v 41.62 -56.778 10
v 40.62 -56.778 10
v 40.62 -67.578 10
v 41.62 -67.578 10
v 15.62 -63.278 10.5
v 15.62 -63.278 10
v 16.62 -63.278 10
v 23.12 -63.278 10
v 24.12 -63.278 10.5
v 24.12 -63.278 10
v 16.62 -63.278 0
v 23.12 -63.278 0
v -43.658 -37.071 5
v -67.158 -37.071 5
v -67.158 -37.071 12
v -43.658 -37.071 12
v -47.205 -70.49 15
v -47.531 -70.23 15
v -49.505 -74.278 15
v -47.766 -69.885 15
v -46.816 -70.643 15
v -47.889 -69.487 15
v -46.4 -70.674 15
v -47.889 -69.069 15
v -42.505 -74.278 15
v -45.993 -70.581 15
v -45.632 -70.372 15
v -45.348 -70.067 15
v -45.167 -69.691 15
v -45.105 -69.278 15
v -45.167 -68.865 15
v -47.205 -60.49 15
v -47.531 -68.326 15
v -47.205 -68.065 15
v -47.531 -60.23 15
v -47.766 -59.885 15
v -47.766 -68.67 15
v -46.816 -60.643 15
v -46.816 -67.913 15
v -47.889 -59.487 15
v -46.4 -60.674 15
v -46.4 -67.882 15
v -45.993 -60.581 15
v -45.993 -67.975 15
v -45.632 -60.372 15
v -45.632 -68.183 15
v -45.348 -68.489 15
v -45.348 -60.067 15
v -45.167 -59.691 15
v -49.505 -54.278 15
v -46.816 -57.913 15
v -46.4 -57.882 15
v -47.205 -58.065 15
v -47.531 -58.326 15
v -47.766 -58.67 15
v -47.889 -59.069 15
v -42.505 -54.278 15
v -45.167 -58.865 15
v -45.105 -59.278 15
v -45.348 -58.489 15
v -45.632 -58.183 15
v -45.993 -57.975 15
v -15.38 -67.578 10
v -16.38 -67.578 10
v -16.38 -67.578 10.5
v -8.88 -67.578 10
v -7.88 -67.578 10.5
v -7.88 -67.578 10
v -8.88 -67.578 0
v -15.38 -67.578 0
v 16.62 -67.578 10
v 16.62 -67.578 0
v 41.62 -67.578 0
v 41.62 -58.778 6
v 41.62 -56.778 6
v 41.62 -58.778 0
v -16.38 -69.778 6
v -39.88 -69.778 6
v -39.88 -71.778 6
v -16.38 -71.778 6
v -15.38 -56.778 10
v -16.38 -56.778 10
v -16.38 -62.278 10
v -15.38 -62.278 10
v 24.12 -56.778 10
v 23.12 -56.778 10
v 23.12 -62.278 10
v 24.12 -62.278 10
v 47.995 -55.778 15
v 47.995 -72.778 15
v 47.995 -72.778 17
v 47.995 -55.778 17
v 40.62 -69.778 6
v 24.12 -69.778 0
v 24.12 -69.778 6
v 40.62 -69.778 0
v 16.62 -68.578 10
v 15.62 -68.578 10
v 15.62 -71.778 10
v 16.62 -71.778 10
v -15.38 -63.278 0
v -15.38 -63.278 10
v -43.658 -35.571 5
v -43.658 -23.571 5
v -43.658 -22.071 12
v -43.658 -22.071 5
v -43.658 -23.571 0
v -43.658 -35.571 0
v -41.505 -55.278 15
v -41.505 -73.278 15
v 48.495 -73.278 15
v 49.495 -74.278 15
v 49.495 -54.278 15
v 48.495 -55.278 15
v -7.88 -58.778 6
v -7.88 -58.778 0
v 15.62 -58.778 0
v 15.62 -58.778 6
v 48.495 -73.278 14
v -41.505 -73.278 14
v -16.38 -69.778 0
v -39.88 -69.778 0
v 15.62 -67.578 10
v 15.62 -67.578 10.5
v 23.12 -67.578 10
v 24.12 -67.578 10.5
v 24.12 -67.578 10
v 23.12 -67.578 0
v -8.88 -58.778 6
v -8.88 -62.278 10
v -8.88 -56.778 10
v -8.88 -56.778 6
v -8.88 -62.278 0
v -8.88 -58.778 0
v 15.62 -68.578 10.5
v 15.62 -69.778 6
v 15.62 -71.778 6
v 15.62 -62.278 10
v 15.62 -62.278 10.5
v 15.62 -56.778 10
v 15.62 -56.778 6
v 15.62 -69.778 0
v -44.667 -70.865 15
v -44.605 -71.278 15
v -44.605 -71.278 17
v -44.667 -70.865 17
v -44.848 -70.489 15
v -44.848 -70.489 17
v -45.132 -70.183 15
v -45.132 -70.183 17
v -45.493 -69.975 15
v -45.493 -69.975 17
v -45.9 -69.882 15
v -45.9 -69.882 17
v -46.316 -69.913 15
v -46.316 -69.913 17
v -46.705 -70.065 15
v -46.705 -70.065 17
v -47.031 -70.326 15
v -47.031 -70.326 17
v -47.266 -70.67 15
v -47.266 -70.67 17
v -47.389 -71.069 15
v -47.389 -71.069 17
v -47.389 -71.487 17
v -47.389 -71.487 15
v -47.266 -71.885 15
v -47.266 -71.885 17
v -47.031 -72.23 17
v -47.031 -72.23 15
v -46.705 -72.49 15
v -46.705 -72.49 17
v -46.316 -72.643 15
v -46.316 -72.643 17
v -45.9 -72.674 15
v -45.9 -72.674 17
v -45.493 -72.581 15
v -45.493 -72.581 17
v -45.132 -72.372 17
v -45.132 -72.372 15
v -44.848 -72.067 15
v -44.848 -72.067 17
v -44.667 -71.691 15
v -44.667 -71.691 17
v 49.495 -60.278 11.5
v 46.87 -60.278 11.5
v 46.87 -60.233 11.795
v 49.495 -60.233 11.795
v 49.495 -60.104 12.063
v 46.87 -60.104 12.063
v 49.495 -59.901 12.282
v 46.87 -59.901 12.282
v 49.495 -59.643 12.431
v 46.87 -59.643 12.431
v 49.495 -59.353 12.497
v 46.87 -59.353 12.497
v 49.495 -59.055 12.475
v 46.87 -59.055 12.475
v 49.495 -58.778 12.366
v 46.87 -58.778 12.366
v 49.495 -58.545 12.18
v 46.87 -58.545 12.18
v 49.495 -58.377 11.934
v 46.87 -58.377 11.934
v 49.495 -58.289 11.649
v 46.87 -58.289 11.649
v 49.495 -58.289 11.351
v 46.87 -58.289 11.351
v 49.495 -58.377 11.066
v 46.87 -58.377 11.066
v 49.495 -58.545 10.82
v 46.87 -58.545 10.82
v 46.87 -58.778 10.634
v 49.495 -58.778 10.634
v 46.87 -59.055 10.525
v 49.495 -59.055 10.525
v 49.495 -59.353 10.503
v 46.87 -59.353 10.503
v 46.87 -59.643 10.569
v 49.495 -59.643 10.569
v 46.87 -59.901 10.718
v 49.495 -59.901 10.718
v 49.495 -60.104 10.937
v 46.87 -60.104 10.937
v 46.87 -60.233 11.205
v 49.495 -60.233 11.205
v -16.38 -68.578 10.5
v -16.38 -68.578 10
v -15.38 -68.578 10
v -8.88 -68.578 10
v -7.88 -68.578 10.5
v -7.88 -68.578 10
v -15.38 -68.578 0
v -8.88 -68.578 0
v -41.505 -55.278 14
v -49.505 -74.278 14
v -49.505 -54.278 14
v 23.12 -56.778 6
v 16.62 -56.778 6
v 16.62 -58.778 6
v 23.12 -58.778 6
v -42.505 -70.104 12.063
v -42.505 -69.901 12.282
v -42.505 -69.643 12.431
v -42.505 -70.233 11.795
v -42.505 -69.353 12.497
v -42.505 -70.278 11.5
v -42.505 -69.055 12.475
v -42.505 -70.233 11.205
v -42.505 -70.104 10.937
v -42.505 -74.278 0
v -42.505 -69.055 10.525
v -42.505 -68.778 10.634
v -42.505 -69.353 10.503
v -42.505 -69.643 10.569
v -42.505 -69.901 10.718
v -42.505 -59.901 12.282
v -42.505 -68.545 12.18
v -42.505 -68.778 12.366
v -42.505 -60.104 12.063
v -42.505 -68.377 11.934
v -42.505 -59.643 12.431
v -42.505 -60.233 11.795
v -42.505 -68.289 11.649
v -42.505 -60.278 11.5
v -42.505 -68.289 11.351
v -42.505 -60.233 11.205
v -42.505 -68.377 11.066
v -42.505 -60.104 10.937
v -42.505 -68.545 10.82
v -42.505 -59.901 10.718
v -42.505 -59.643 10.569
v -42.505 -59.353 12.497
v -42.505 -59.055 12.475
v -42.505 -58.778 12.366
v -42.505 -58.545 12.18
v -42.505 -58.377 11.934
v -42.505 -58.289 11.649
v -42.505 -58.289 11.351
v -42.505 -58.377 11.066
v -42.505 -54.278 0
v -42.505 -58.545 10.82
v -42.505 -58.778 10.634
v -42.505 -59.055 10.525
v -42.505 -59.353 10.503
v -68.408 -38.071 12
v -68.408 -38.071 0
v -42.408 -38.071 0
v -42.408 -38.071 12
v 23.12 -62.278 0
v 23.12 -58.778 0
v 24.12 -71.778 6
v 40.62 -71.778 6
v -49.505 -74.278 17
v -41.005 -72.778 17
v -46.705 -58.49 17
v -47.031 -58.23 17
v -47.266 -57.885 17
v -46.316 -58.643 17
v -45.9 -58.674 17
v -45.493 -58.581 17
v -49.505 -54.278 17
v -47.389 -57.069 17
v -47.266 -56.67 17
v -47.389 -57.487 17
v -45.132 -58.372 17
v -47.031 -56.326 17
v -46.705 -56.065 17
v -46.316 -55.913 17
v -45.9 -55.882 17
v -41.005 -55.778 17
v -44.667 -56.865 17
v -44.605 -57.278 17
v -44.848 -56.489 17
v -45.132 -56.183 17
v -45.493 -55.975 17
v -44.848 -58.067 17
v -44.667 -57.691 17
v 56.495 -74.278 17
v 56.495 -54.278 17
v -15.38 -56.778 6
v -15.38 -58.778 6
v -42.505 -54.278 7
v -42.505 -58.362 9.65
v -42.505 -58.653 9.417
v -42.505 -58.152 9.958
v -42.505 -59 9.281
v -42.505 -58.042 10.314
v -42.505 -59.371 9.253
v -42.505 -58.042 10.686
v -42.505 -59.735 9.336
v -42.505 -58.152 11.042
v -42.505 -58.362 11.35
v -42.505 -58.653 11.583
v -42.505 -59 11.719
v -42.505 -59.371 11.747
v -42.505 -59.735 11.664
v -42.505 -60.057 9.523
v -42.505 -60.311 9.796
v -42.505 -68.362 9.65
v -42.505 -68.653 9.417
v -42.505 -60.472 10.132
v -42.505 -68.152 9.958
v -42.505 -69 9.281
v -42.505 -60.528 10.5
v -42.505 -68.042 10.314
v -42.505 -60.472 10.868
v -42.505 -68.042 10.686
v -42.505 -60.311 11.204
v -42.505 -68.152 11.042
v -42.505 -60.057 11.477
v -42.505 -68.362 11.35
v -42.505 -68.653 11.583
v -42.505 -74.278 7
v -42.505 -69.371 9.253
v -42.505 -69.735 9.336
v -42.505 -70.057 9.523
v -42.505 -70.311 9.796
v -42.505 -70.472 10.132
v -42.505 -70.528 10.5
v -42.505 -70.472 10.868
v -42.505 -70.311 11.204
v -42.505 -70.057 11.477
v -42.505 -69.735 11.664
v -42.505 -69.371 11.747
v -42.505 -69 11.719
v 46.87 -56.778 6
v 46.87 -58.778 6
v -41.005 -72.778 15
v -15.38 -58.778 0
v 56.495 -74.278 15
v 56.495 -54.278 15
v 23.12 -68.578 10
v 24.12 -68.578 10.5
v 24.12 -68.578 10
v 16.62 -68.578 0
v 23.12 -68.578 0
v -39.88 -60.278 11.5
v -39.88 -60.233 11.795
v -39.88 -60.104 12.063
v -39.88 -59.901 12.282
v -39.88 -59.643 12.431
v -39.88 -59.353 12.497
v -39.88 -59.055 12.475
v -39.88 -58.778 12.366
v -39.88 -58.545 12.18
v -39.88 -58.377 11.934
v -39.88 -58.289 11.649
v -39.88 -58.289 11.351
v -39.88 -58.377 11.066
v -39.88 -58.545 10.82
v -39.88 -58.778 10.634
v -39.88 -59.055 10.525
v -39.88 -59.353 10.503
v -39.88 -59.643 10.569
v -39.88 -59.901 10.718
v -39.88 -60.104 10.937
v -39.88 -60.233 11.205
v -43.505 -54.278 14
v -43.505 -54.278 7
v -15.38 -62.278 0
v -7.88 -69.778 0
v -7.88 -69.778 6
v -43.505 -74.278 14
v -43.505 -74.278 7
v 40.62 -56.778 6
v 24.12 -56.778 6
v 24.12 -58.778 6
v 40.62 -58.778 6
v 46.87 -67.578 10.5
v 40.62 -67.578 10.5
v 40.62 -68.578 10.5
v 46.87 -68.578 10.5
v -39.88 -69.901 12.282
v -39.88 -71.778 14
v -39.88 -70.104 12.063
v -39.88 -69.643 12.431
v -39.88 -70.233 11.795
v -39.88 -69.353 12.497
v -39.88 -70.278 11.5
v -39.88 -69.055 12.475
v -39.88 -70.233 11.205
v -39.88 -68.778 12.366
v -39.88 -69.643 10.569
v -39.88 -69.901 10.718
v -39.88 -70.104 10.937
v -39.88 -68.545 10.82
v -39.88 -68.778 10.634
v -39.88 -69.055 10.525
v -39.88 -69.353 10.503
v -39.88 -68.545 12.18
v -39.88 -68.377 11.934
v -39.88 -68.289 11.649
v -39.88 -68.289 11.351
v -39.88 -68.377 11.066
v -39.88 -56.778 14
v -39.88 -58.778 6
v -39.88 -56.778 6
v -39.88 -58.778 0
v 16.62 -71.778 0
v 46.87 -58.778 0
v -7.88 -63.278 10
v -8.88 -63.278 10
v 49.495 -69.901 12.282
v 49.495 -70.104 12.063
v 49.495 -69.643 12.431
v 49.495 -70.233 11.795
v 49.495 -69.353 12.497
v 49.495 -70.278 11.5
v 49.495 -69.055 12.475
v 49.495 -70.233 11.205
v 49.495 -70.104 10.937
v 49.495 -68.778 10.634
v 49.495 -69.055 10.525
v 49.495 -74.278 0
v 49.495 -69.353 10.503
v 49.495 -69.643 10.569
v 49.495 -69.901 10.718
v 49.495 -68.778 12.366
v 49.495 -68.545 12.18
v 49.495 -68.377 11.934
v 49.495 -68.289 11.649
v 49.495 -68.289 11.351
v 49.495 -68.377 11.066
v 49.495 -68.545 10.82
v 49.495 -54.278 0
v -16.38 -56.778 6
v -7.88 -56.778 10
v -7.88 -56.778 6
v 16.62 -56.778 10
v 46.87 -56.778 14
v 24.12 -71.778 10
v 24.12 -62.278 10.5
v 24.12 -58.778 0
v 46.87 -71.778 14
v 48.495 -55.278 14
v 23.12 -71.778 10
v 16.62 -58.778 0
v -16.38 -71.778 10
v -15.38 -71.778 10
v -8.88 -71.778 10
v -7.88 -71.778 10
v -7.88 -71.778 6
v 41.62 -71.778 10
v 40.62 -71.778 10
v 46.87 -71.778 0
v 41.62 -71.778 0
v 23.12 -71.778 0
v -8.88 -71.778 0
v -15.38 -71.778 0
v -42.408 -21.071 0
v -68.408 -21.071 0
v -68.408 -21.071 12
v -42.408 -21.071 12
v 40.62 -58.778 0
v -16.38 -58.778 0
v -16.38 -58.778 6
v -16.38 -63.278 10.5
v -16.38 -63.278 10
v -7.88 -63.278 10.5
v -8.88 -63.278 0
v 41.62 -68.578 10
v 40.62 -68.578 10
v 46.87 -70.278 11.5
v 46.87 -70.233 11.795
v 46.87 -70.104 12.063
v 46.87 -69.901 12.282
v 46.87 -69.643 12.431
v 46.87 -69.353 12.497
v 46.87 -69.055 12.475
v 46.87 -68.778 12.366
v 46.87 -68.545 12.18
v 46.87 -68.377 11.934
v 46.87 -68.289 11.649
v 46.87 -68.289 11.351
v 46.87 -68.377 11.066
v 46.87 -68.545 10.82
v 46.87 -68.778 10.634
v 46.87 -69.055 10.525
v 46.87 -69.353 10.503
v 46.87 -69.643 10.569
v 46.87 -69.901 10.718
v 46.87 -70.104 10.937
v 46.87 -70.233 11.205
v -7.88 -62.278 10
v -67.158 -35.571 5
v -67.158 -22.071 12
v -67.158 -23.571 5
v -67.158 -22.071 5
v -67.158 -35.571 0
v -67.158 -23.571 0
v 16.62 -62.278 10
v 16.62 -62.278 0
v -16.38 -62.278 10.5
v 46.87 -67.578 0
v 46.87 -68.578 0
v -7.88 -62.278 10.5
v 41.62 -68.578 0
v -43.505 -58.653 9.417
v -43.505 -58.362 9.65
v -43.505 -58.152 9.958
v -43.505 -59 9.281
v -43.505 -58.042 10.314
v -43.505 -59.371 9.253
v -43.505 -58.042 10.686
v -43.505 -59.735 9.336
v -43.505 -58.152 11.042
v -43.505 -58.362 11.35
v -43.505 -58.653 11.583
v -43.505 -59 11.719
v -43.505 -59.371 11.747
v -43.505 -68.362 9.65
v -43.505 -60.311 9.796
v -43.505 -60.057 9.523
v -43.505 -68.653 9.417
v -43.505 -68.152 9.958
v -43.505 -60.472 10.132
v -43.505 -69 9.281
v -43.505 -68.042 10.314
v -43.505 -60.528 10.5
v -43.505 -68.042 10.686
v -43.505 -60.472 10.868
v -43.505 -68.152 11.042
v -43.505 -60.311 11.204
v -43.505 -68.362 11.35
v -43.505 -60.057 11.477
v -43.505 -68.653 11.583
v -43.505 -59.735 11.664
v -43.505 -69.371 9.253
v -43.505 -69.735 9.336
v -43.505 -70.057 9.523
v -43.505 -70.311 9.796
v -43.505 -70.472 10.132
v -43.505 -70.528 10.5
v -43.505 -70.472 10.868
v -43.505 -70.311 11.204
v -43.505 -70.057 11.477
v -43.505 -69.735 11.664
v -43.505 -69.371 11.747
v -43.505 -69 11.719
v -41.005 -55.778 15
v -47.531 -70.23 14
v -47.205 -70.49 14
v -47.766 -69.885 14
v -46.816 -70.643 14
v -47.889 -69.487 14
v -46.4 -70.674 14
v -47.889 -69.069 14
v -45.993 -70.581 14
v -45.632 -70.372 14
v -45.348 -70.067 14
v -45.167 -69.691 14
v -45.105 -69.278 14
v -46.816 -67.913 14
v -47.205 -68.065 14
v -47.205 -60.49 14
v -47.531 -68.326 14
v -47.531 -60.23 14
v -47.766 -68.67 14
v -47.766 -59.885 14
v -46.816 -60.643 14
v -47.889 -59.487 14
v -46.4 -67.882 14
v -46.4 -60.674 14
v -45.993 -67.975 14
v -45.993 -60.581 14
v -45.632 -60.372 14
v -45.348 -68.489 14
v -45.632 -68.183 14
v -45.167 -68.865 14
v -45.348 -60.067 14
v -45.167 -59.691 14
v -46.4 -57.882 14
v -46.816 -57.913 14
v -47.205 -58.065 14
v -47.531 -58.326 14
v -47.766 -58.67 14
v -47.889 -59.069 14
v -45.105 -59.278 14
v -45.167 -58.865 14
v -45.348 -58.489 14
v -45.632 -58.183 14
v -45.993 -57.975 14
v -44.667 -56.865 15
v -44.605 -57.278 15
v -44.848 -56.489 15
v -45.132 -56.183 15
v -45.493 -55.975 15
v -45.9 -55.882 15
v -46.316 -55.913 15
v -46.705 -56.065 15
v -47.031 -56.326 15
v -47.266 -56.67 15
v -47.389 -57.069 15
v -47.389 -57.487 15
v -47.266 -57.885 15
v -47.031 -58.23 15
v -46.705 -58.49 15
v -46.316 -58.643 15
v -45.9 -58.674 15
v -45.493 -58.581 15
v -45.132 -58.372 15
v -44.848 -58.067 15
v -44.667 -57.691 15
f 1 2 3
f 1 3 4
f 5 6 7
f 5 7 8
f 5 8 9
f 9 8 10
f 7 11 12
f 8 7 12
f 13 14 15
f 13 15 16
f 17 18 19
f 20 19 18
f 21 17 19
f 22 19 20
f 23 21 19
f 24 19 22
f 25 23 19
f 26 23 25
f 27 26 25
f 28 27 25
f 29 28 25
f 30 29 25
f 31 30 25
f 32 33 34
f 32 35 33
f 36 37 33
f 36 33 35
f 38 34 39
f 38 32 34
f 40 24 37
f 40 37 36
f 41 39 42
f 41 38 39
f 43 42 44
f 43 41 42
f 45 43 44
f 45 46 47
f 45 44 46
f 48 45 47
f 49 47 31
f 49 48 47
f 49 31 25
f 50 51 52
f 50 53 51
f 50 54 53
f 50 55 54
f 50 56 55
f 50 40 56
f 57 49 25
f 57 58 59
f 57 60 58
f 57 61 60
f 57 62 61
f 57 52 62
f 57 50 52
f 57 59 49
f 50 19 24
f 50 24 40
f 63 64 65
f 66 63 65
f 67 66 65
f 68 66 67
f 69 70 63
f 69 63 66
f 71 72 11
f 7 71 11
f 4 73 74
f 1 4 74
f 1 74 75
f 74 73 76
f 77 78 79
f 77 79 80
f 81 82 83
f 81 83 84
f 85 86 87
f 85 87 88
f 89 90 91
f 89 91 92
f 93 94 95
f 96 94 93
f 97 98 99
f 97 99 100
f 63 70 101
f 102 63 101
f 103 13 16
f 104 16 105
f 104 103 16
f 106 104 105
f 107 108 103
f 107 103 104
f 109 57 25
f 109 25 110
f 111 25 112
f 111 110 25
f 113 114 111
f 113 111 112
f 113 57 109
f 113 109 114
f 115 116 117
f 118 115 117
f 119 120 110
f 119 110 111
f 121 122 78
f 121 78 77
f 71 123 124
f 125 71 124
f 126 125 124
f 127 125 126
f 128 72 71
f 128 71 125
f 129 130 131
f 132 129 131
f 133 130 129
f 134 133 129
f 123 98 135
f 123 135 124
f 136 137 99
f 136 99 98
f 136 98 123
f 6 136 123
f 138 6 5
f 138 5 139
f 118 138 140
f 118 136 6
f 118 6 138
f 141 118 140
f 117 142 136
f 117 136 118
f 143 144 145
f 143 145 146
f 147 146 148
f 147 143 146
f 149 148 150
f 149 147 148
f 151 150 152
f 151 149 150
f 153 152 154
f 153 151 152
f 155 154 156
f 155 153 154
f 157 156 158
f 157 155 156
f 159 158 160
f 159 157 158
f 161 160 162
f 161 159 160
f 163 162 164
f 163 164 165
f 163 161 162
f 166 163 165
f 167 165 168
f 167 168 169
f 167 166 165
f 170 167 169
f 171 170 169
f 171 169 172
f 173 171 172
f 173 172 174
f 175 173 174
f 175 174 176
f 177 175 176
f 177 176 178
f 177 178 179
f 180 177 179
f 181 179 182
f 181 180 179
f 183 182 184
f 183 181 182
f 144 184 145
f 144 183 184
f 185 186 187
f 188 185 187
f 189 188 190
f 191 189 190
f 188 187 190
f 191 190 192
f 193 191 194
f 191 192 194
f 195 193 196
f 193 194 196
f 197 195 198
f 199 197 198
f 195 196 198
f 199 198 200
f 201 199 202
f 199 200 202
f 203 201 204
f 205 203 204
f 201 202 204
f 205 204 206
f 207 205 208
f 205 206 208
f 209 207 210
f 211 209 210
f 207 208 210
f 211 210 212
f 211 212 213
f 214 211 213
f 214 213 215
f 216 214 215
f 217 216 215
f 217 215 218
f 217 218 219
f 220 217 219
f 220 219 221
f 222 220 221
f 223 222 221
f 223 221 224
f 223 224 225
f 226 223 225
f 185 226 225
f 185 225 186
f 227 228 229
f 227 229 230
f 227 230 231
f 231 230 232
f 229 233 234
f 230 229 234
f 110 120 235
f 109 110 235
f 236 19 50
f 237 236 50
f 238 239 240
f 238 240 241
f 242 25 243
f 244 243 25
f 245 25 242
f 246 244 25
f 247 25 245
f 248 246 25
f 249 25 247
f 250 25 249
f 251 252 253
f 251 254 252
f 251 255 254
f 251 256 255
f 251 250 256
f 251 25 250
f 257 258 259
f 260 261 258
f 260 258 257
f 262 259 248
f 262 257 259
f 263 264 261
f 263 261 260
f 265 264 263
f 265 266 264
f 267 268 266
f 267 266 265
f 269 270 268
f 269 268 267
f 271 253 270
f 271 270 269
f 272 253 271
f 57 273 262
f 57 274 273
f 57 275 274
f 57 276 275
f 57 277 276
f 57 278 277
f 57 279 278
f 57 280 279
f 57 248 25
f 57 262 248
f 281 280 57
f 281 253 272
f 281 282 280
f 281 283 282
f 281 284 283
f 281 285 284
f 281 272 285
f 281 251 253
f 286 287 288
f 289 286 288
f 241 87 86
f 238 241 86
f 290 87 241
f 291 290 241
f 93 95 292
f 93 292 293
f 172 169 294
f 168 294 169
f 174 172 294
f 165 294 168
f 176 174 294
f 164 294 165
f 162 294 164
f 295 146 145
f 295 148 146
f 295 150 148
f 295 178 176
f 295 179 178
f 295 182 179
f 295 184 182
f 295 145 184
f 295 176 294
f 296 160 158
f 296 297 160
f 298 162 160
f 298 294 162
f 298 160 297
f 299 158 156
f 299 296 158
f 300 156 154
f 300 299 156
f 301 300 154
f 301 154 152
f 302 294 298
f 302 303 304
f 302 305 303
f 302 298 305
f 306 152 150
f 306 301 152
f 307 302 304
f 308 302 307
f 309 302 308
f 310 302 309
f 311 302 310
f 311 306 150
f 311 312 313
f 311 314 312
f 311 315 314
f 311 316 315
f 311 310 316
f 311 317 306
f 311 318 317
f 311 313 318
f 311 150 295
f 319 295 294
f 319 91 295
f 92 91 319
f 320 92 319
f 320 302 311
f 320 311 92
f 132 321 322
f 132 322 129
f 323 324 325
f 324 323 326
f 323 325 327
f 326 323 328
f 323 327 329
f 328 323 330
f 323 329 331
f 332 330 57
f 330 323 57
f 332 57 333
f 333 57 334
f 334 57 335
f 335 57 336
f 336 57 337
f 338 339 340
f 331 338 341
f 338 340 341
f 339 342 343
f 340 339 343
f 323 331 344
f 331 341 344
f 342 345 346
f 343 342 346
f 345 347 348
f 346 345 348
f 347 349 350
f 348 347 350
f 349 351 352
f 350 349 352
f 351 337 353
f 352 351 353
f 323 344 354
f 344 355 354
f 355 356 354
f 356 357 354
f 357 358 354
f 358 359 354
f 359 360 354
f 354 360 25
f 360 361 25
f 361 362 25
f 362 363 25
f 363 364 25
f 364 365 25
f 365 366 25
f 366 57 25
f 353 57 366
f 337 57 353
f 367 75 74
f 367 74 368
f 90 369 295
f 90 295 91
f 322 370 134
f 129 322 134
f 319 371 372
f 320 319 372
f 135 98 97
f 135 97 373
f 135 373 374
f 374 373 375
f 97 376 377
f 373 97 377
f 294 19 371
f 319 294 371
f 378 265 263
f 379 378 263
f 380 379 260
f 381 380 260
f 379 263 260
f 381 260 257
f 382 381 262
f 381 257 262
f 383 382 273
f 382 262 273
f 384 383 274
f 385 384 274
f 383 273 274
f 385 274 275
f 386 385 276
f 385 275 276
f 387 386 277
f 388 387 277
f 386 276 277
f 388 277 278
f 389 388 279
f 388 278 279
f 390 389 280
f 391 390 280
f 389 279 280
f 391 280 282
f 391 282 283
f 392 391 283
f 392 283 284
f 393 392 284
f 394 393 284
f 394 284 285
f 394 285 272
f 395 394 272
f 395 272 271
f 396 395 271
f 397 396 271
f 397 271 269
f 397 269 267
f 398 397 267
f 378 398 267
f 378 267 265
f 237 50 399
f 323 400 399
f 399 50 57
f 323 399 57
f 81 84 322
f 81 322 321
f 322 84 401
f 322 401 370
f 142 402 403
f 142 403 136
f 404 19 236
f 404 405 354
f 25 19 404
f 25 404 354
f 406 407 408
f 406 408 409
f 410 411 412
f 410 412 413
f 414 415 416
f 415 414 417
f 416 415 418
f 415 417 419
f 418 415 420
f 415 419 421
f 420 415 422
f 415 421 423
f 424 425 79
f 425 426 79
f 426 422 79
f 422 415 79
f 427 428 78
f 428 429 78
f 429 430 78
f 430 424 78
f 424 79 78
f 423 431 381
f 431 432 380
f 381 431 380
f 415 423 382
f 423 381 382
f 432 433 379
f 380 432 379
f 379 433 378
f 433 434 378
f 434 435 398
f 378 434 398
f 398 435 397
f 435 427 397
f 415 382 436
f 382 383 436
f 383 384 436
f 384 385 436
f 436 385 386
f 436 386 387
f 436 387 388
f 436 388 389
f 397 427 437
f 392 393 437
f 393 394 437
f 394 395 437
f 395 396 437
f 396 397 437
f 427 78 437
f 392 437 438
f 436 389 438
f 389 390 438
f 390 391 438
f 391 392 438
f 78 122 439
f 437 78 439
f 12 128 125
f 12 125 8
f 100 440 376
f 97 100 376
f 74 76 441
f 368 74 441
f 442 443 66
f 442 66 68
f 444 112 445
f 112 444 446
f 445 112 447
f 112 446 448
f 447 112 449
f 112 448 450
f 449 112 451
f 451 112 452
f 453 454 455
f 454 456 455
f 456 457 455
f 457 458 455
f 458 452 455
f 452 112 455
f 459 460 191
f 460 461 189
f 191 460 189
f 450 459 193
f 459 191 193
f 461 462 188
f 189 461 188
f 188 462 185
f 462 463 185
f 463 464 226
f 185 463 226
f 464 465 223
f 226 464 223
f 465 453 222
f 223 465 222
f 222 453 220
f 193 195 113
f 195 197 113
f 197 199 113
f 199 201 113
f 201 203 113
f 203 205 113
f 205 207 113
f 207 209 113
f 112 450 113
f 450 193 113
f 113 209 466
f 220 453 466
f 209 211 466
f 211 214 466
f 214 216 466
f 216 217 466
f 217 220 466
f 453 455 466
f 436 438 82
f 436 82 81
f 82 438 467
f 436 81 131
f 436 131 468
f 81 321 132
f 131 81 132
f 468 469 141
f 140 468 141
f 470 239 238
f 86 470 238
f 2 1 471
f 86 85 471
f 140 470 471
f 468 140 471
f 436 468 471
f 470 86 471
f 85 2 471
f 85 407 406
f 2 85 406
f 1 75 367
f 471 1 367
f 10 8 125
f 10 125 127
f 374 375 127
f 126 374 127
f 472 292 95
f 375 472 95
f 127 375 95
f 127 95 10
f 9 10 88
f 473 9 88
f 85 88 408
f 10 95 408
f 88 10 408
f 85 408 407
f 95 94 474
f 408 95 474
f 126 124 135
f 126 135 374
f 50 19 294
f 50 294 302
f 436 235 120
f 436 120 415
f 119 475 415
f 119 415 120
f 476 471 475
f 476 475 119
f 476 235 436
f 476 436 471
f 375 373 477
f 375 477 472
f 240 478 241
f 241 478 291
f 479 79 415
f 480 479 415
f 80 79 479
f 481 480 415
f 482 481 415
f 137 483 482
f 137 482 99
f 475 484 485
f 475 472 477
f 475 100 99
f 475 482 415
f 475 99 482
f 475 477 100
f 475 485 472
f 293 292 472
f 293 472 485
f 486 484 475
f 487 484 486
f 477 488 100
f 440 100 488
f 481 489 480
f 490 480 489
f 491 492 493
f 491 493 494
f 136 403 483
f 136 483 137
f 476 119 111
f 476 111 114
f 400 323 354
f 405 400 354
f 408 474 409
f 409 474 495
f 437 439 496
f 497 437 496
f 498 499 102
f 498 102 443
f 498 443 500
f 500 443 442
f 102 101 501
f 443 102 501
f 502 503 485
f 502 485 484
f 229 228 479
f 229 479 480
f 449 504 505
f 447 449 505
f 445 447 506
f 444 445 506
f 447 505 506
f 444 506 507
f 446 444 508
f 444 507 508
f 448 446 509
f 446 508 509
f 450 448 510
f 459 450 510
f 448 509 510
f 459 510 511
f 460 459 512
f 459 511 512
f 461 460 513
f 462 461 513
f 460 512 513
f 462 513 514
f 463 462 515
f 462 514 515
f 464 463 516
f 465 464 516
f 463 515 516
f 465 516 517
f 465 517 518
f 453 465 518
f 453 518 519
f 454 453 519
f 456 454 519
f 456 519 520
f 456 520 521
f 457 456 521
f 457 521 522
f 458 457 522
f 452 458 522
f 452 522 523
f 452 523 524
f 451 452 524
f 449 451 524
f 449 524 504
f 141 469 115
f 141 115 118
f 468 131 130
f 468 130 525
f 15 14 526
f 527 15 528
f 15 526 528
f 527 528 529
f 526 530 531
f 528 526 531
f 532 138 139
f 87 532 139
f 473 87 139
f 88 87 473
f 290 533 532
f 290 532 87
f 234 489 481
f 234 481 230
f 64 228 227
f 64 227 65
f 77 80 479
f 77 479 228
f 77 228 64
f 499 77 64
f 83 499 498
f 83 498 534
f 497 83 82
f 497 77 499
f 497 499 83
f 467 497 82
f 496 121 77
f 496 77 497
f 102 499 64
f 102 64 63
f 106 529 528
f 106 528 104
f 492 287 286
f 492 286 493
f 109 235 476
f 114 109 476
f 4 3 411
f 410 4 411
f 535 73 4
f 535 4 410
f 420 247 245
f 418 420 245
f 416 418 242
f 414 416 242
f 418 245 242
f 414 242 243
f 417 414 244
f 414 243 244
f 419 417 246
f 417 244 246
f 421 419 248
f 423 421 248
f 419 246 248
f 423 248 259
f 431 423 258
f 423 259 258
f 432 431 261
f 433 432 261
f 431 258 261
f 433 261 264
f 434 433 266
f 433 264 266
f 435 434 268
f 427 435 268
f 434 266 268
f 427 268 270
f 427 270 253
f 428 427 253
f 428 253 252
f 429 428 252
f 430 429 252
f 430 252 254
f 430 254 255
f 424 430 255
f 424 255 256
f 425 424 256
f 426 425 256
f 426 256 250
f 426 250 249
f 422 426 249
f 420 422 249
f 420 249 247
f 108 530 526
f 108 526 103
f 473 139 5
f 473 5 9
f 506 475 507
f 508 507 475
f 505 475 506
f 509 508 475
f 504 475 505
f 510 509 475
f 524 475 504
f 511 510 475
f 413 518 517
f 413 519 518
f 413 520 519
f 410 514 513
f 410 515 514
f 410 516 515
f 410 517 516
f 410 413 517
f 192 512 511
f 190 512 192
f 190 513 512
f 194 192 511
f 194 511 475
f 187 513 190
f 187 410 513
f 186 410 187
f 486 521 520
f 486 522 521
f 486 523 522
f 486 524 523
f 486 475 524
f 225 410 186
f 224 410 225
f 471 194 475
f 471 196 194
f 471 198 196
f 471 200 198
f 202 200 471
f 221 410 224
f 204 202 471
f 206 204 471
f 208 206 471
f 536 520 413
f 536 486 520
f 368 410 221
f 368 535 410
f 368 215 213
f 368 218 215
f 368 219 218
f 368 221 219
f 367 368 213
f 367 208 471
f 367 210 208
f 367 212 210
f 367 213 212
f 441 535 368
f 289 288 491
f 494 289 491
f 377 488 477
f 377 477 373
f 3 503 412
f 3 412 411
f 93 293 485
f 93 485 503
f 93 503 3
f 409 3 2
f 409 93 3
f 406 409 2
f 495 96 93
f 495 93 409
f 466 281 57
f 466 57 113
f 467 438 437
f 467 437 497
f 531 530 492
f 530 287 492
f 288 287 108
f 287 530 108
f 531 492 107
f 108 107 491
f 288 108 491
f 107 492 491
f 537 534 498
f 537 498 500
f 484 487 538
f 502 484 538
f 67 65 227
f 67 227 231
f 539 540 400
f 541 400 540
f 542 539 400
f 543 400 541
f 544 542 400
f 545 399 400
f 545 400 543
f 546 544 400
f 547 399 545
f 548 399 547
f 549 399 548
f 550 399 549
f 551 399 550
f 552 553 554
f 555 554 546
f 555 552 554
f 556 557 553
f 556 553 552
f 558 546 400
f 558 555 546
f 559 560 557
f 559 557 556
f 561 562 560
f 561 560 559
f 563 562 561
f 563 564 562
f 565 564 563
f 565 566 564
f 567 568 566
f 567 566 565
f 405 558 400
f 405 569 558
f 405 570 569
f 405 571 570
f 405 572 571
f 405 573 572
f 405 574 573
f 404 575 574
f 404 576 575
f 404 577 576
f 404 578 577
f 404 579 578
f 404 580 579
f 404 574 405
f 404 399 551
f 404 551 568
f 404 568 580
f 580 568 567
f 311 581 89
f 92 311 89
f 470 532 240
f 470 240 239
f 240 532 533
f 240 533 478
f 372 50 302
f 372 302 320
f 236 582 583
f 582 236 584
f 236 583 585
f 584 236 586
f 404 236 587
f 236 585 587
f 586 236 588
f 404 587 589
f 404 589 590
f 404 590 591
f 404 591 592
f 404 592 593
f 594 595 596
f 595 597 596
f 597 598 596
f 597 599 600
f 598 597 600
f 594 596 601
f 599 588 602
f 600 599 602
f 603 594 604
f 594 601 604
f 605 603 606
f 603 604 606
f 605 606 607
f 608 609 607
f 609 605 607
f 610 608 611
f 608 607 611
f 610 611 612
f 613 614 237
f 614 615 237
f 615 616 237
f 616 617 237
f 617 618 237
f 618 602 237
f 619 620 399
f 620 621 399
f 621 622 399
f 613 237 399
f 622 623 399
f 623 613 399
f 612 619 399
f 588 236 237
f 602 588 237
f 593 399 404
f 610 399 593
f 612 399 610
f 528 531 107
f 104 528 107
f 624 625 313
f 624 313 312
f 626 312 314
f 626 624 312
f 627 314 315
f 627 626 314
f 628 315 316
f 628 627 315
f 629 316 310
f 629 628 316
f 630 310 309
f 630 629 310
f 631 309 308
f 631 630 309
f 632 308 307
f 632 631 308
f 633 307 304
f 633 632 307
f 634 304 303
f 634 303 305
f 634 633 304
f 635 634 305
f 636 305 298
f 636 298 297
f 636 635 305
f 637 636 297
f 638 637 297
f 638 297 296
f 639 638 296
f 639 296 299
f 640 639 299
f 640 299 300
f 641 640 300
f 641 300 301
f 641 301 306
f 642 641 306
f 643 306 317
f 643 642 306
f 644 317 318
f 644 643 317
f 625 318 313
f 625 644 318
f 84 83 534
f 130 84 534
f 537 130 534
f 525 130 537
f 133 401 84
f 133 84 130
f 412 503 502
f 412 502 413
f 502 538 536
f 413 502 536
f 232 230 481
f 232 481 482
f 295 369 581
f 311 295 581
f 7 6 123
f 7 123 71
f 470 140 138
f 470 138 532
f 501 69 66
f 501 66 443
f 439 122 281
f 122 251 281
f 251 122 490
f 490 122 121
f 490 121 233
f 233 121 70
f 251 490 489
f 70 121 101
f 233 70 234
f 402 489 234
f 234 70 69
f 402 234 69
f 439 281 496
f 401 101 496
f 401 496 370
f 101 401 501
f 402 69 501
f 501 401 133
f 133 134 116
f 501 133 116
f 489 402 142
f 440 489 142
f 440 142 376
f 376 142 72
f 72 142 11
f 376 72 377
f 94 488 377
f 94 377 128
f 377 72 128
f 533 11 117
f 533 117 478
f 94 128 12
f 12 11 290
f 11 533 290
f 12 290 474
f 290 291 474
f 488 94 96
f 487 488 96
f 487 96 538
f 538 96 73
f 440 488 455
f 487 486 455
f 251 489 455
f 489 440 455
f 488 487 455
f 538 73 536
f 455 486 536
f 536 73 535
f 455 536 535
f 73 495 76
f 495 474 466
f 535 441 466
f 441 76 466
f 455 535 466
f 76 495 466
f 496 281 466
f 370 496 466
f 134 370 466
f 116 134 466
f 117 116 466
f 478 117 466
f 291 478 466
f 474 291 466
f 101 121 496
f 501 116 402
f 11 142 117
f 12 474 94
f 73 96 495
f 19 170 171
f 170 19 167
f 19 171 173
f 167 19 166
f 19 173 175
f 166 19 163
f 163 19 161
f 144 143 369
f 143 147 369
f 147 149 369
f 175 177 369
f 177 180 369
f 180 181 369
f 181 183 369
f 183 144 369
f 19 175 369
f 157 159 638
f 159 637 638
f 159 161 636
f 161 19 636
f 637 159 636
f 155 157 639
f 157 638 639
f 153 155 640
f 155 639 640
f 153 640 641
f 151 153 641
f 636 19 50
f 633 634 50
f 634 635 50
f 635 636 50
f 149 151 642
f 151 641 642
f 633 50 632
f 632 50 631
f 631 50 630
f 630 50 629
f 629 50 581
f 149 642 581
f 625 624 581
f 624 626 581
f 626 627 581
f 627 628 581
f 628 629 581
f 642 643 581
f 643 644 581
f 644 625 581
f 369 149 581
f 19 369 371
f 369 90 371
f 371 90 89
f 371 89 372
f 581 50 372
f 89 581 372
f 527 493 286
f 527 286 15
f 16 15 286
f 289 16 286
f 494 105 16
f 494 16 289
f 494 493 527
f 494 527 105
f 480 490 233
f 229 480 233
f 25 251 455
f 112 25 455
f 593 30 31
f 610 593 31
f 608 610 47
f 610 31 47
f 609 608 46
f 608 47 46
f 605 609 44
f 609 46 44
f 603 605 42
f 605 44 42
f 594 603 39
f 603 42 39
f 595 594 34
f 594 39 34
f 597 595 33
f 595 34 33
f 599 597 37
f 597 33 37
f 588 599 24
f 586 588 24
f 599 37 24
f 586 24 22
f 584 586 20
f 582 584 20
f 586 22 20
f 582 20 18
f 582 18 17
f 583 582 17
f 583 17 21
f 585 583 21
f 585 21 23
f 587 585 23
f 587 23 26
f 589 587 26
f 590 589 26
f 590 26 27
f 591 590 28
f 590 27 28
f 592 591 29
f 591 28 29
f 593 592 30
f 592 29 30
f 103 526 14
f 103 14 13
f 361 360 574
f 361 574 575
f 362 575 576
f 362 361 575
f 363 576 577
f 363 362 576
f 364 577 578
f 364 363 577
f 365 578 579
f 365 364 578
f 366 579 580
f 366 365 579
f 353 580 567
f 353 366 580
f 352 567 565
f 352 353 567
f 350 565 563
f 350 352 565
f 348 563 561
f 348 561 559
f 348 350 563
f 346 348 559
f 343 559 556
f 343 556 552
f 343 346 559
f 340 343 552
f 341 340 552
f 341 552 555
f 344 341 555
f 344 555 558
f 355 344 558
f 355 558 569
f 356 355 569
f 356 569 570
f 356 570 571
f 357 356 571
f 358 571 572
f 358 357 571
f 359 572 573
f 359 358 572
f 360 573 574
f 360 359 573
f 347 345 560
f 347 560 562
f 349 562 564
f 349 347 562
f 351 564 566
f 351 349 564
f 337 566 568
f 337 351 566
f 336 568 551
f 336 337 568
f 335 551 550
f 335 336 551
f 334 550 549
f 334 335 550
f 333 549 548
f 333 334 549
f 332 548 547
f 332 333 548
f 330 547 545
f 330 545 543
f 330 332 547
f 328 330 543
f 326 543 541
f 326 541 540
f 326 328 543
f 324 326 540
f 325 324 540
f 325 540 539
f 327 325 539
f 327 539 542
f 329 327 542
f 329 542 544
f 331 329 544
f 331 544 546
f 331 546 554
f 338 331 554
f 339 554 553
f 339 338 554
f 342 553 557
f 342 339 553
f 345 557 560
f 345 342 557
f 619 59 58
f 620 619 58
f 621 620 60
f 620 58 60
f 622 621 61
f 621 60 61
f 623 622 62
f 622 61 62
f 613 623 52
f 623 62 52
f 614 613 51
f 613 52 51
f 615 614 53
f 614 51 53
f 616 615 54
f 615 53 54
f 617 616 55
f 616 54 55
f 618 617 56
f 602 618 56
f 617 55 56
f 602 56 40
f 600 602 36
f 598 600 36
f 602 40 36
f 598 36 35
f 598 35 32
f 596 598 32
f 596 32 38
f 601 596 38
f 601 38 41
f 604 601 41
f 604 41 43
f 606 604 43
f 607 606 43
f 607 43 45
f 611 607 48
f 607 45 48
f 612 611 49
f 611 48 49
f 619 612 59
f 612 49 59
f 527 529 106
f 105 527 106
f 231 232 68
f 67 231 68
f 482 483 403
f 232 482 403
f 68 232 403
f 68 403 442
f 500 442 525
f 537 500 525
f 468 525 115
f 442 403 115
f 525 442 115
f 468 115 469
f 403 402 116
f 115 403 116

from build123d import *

# Parameters (mm, degrees)
F0_W      = 26
F0_H      = 17
F0_W_2    = 23.5
F0_H_2    = 15
F1_DEPTH  = 12
F2_W      = 23.5
F2_H      = 1.5
F3_DEPTH  = 5
F4_W      = 90
F4_H      = 18
F4_W_2    = 23.5
F4_H_2    = 15
F4_W_3    = 6.5
F4_W_4    = 16.5
F4_W_5    = 5.25
F5_DEPTH  = 14
F6_W      = 63.329597
F6_H      = 15
F7_DEPTH  = 4
F8_W      = 86.75
F8_H      = 2
F8_W_2    = 23.5
F8_W_3    = 16.5
F9_DEPTH  = 6
F10_W     = 8.5
F10_H     = 1
F10_W_2   = 6.25
F11_DEPTH = 10.5
F12_W     = 92
F12_H     = 20
F12_W_2   = 90
F12_H_2   = 18
F13_DEPTH = 15
F14_R     = 1
F15_DEPTH = 100.1
F16_W     = 20
F16_H     = 8
F16_R     = 1.25
F17_DEPTH = 1
F18_W     = 6
F18_H     = 20
F18_R     = 1.4
F19_DEPTH = 1
F20_W     = 106
F20_H     = 20
F20_R     = 1.4
F20_W_2   = 89
F20_H_2   = 17
F21_DEPTH = 2


with BuildPart() as f1:
    # F0 (on Top) → F1 (new body)
    with BuildSketch(Plane.XY):
        with Locations((-55.407508, -29.570559)):
            Rectangle(F0_W, F0_H)
        with Locations((-55.407508, -29.570559)):
            Rectangle(F0_W_2, F0_H_2, mode=Mode.SUBTRACT)
    extrude(amount=F1_DEPTH)

    # F2 (on Top) → F3 (join)
    with BuildSketch(Plane.XY):
        with Locations((-55.407508, -22.820559)):
            Rectangle(F2_W, F2_H)
        with Locations((-55.407508, -36.320559)):
            Rectangle(F2_W, F2_H)
    extrude(amount=F3_DEPTH)


with BuildPart() as f5:
    # F4 (on Top) → F5 (new body)
    with BuildSketch(Plane.XY):
        with Locations((3.495086, -64.277902)):
            Rectangle(F4_W, F4_H)
        with Locations((-28.129914, -64.277902)):
            Rectangle(F4_W_2, F4_H_2, mode=Mode.SUBTRACT)
        with Locations((-12.129914, -64.277902)):
            Rectangle(F4_W_3, F4_H_2, mode=Mode.SUBTRACT)
        with Locations((3.870086, -64.277902)):
            Rectangle(F4_W_2, F4_H_2, mode=Mode.SUBTRACT)
        with Locations((19.870086, -64.277902)):
            Rectangle(F4_W_3, F4_H_2, mode=Mode.SUBTRACT)
        with Locations((32.370086, -64.277902)):
            Rectangle(F4_W_4, F4_H_2, mode=Mode.SUBTRACT)
        with Locations((44.245086, -64.277902)):
            Rectangle(F4_W_5, F4_H_2, mode=Mode.SUBTRACT)
    extrude(amount=F5_DEPTH)

    # F6 (on face) → F7 (cut)
    with BuildSketch(Plane.XY.offset(14)):
        with Locations((11.350946, -64.277902)):
            Rectangle(F6_W, F6_H)
    extrude(amount=-F7_DEPTH, mode=Mode.SUBTRACT)

    # F8 (on Top) → F9 (join)
    with BuildSketch(Plane.XY):
        with Locations((3.495086, -57.777902)):
            Rectangle(F8_W, F8_H)
        with Locations((-28.129914, -70.777902)):
            Rectangle(F8_W_2, F8_H)
        with Locations((3.870086, -70.777902)):
            Rectangle(F8_W_2, F8_H)
        with Locations((32.370086, -70.777902)):
            Rectangle(F8_W_3, F8_H)
    extrude(amount=F9_DEPTH)

    # F10 (on Top) → F11 (join)
    with BuildSketch(Plane.XY):
        with Locations((-12.129914, -62.777902)):
            Rectangle(F10_W, F10_H)
        with Locations((19.870086, -62.777902)):
            Rectangle(F10_W, F10_H)
        with Locations((-12.129914, -68.077902)):
            Rectangle(F10_W, F10_H)
        with Locations((19.870086, -68.077902)):
            Rectangle(F10_W, F10_H)
        with Locations((43.745086, -68.077902)):
            Rectangle(F10_W_2, F10_H)
    extrude(amount=F11_DEPTH)

    # F12 (on Top) → F13 (join)
    with BuildSketch(Plane.XY):
        with Locations((3.495086, -64.277902)):
            Rectangle(F12_W, F12_H)
        with Locations((3.495086, -64.277902)):
            Rectangle(F12_W_2, F12_H_2, mode=Mode.SUBTRACT)
    extrude(amount=F13_DEPTH)

    # F14 (on face) → F15 (cut)
    with BuildSketch(Plane(origin=(-42.504914, 0, 0), x_dir=(0, -1, 0), z_dir=(-1, 0, 0))):
        with Locations((59.277902, 11.5)):
            Circle(F14_R)
        with Locations((69.277902, 11.5)):
            Circle(F14_R)
    extrude(amount=-F15_DEPTH, mode=Mode.SUBTRACT)


with BuildPart() as f17:
    # F16 (on face) → F17 (new body)
    with BuildSketch(Plane(origin=(-42.504914, 0, 0), x_dir=(0, -1, 0), z_dir=(-1, 0, 0))):
        with Locations((64.277902, 11)):
            Rectangle(F16_W, F16_H)
        with Locations((59.277902, 10.5)):
            Circle(F16_R, mode=Mode.SUBTRACT)
        with Locations((69.277902, 10.5)):
            Circle(F16_R, mode=Mode.SUBTRACT)
    extrude(amount=F17_DEPTH)

    # F18 (on face) → F19 (join)
    with BuildSketch(Plane.XY.offset(15)):
        with Locations((-46.504914, -64.277902)):
            Rectangle(F18_W, F18_H)
        with Locations((-46.504914, -69.277902)):
            Circle(F18_R, mode=Mode.SUBTRACT)
        with Locations((-46.504914, -59.277902)):
            Circle(F18_R, mode=Mode.SUBTRACT)
    extrude(amount=-F19_DEPTH)


with BuildPart() as f21:
    # F20 (on face) → F21 (new body)
    with BuildSketch(Plane.XY.offset(15)):
        with Locations((3.495086, -64.277902)):
            Rectangle(F20_W, F20_H)
        with Locations((-46.004914, -71.277902)):
            Circle(F20_R, mode=Mode.SUBTRACT)
        with Locations((-46.004914, -57.277902)):
            Circle(F20_R, mode=Mode.SUBTRACT)
        with Locations((3.495086, -64.277902)):
            Rectangle(F20_W_2, F20_H_2, mode=Mode.SUBTRACT)
    extrude(amount=F21_DEPTH)


solid = Compound([f1.part, f5.part, f17.part, f21.part])
